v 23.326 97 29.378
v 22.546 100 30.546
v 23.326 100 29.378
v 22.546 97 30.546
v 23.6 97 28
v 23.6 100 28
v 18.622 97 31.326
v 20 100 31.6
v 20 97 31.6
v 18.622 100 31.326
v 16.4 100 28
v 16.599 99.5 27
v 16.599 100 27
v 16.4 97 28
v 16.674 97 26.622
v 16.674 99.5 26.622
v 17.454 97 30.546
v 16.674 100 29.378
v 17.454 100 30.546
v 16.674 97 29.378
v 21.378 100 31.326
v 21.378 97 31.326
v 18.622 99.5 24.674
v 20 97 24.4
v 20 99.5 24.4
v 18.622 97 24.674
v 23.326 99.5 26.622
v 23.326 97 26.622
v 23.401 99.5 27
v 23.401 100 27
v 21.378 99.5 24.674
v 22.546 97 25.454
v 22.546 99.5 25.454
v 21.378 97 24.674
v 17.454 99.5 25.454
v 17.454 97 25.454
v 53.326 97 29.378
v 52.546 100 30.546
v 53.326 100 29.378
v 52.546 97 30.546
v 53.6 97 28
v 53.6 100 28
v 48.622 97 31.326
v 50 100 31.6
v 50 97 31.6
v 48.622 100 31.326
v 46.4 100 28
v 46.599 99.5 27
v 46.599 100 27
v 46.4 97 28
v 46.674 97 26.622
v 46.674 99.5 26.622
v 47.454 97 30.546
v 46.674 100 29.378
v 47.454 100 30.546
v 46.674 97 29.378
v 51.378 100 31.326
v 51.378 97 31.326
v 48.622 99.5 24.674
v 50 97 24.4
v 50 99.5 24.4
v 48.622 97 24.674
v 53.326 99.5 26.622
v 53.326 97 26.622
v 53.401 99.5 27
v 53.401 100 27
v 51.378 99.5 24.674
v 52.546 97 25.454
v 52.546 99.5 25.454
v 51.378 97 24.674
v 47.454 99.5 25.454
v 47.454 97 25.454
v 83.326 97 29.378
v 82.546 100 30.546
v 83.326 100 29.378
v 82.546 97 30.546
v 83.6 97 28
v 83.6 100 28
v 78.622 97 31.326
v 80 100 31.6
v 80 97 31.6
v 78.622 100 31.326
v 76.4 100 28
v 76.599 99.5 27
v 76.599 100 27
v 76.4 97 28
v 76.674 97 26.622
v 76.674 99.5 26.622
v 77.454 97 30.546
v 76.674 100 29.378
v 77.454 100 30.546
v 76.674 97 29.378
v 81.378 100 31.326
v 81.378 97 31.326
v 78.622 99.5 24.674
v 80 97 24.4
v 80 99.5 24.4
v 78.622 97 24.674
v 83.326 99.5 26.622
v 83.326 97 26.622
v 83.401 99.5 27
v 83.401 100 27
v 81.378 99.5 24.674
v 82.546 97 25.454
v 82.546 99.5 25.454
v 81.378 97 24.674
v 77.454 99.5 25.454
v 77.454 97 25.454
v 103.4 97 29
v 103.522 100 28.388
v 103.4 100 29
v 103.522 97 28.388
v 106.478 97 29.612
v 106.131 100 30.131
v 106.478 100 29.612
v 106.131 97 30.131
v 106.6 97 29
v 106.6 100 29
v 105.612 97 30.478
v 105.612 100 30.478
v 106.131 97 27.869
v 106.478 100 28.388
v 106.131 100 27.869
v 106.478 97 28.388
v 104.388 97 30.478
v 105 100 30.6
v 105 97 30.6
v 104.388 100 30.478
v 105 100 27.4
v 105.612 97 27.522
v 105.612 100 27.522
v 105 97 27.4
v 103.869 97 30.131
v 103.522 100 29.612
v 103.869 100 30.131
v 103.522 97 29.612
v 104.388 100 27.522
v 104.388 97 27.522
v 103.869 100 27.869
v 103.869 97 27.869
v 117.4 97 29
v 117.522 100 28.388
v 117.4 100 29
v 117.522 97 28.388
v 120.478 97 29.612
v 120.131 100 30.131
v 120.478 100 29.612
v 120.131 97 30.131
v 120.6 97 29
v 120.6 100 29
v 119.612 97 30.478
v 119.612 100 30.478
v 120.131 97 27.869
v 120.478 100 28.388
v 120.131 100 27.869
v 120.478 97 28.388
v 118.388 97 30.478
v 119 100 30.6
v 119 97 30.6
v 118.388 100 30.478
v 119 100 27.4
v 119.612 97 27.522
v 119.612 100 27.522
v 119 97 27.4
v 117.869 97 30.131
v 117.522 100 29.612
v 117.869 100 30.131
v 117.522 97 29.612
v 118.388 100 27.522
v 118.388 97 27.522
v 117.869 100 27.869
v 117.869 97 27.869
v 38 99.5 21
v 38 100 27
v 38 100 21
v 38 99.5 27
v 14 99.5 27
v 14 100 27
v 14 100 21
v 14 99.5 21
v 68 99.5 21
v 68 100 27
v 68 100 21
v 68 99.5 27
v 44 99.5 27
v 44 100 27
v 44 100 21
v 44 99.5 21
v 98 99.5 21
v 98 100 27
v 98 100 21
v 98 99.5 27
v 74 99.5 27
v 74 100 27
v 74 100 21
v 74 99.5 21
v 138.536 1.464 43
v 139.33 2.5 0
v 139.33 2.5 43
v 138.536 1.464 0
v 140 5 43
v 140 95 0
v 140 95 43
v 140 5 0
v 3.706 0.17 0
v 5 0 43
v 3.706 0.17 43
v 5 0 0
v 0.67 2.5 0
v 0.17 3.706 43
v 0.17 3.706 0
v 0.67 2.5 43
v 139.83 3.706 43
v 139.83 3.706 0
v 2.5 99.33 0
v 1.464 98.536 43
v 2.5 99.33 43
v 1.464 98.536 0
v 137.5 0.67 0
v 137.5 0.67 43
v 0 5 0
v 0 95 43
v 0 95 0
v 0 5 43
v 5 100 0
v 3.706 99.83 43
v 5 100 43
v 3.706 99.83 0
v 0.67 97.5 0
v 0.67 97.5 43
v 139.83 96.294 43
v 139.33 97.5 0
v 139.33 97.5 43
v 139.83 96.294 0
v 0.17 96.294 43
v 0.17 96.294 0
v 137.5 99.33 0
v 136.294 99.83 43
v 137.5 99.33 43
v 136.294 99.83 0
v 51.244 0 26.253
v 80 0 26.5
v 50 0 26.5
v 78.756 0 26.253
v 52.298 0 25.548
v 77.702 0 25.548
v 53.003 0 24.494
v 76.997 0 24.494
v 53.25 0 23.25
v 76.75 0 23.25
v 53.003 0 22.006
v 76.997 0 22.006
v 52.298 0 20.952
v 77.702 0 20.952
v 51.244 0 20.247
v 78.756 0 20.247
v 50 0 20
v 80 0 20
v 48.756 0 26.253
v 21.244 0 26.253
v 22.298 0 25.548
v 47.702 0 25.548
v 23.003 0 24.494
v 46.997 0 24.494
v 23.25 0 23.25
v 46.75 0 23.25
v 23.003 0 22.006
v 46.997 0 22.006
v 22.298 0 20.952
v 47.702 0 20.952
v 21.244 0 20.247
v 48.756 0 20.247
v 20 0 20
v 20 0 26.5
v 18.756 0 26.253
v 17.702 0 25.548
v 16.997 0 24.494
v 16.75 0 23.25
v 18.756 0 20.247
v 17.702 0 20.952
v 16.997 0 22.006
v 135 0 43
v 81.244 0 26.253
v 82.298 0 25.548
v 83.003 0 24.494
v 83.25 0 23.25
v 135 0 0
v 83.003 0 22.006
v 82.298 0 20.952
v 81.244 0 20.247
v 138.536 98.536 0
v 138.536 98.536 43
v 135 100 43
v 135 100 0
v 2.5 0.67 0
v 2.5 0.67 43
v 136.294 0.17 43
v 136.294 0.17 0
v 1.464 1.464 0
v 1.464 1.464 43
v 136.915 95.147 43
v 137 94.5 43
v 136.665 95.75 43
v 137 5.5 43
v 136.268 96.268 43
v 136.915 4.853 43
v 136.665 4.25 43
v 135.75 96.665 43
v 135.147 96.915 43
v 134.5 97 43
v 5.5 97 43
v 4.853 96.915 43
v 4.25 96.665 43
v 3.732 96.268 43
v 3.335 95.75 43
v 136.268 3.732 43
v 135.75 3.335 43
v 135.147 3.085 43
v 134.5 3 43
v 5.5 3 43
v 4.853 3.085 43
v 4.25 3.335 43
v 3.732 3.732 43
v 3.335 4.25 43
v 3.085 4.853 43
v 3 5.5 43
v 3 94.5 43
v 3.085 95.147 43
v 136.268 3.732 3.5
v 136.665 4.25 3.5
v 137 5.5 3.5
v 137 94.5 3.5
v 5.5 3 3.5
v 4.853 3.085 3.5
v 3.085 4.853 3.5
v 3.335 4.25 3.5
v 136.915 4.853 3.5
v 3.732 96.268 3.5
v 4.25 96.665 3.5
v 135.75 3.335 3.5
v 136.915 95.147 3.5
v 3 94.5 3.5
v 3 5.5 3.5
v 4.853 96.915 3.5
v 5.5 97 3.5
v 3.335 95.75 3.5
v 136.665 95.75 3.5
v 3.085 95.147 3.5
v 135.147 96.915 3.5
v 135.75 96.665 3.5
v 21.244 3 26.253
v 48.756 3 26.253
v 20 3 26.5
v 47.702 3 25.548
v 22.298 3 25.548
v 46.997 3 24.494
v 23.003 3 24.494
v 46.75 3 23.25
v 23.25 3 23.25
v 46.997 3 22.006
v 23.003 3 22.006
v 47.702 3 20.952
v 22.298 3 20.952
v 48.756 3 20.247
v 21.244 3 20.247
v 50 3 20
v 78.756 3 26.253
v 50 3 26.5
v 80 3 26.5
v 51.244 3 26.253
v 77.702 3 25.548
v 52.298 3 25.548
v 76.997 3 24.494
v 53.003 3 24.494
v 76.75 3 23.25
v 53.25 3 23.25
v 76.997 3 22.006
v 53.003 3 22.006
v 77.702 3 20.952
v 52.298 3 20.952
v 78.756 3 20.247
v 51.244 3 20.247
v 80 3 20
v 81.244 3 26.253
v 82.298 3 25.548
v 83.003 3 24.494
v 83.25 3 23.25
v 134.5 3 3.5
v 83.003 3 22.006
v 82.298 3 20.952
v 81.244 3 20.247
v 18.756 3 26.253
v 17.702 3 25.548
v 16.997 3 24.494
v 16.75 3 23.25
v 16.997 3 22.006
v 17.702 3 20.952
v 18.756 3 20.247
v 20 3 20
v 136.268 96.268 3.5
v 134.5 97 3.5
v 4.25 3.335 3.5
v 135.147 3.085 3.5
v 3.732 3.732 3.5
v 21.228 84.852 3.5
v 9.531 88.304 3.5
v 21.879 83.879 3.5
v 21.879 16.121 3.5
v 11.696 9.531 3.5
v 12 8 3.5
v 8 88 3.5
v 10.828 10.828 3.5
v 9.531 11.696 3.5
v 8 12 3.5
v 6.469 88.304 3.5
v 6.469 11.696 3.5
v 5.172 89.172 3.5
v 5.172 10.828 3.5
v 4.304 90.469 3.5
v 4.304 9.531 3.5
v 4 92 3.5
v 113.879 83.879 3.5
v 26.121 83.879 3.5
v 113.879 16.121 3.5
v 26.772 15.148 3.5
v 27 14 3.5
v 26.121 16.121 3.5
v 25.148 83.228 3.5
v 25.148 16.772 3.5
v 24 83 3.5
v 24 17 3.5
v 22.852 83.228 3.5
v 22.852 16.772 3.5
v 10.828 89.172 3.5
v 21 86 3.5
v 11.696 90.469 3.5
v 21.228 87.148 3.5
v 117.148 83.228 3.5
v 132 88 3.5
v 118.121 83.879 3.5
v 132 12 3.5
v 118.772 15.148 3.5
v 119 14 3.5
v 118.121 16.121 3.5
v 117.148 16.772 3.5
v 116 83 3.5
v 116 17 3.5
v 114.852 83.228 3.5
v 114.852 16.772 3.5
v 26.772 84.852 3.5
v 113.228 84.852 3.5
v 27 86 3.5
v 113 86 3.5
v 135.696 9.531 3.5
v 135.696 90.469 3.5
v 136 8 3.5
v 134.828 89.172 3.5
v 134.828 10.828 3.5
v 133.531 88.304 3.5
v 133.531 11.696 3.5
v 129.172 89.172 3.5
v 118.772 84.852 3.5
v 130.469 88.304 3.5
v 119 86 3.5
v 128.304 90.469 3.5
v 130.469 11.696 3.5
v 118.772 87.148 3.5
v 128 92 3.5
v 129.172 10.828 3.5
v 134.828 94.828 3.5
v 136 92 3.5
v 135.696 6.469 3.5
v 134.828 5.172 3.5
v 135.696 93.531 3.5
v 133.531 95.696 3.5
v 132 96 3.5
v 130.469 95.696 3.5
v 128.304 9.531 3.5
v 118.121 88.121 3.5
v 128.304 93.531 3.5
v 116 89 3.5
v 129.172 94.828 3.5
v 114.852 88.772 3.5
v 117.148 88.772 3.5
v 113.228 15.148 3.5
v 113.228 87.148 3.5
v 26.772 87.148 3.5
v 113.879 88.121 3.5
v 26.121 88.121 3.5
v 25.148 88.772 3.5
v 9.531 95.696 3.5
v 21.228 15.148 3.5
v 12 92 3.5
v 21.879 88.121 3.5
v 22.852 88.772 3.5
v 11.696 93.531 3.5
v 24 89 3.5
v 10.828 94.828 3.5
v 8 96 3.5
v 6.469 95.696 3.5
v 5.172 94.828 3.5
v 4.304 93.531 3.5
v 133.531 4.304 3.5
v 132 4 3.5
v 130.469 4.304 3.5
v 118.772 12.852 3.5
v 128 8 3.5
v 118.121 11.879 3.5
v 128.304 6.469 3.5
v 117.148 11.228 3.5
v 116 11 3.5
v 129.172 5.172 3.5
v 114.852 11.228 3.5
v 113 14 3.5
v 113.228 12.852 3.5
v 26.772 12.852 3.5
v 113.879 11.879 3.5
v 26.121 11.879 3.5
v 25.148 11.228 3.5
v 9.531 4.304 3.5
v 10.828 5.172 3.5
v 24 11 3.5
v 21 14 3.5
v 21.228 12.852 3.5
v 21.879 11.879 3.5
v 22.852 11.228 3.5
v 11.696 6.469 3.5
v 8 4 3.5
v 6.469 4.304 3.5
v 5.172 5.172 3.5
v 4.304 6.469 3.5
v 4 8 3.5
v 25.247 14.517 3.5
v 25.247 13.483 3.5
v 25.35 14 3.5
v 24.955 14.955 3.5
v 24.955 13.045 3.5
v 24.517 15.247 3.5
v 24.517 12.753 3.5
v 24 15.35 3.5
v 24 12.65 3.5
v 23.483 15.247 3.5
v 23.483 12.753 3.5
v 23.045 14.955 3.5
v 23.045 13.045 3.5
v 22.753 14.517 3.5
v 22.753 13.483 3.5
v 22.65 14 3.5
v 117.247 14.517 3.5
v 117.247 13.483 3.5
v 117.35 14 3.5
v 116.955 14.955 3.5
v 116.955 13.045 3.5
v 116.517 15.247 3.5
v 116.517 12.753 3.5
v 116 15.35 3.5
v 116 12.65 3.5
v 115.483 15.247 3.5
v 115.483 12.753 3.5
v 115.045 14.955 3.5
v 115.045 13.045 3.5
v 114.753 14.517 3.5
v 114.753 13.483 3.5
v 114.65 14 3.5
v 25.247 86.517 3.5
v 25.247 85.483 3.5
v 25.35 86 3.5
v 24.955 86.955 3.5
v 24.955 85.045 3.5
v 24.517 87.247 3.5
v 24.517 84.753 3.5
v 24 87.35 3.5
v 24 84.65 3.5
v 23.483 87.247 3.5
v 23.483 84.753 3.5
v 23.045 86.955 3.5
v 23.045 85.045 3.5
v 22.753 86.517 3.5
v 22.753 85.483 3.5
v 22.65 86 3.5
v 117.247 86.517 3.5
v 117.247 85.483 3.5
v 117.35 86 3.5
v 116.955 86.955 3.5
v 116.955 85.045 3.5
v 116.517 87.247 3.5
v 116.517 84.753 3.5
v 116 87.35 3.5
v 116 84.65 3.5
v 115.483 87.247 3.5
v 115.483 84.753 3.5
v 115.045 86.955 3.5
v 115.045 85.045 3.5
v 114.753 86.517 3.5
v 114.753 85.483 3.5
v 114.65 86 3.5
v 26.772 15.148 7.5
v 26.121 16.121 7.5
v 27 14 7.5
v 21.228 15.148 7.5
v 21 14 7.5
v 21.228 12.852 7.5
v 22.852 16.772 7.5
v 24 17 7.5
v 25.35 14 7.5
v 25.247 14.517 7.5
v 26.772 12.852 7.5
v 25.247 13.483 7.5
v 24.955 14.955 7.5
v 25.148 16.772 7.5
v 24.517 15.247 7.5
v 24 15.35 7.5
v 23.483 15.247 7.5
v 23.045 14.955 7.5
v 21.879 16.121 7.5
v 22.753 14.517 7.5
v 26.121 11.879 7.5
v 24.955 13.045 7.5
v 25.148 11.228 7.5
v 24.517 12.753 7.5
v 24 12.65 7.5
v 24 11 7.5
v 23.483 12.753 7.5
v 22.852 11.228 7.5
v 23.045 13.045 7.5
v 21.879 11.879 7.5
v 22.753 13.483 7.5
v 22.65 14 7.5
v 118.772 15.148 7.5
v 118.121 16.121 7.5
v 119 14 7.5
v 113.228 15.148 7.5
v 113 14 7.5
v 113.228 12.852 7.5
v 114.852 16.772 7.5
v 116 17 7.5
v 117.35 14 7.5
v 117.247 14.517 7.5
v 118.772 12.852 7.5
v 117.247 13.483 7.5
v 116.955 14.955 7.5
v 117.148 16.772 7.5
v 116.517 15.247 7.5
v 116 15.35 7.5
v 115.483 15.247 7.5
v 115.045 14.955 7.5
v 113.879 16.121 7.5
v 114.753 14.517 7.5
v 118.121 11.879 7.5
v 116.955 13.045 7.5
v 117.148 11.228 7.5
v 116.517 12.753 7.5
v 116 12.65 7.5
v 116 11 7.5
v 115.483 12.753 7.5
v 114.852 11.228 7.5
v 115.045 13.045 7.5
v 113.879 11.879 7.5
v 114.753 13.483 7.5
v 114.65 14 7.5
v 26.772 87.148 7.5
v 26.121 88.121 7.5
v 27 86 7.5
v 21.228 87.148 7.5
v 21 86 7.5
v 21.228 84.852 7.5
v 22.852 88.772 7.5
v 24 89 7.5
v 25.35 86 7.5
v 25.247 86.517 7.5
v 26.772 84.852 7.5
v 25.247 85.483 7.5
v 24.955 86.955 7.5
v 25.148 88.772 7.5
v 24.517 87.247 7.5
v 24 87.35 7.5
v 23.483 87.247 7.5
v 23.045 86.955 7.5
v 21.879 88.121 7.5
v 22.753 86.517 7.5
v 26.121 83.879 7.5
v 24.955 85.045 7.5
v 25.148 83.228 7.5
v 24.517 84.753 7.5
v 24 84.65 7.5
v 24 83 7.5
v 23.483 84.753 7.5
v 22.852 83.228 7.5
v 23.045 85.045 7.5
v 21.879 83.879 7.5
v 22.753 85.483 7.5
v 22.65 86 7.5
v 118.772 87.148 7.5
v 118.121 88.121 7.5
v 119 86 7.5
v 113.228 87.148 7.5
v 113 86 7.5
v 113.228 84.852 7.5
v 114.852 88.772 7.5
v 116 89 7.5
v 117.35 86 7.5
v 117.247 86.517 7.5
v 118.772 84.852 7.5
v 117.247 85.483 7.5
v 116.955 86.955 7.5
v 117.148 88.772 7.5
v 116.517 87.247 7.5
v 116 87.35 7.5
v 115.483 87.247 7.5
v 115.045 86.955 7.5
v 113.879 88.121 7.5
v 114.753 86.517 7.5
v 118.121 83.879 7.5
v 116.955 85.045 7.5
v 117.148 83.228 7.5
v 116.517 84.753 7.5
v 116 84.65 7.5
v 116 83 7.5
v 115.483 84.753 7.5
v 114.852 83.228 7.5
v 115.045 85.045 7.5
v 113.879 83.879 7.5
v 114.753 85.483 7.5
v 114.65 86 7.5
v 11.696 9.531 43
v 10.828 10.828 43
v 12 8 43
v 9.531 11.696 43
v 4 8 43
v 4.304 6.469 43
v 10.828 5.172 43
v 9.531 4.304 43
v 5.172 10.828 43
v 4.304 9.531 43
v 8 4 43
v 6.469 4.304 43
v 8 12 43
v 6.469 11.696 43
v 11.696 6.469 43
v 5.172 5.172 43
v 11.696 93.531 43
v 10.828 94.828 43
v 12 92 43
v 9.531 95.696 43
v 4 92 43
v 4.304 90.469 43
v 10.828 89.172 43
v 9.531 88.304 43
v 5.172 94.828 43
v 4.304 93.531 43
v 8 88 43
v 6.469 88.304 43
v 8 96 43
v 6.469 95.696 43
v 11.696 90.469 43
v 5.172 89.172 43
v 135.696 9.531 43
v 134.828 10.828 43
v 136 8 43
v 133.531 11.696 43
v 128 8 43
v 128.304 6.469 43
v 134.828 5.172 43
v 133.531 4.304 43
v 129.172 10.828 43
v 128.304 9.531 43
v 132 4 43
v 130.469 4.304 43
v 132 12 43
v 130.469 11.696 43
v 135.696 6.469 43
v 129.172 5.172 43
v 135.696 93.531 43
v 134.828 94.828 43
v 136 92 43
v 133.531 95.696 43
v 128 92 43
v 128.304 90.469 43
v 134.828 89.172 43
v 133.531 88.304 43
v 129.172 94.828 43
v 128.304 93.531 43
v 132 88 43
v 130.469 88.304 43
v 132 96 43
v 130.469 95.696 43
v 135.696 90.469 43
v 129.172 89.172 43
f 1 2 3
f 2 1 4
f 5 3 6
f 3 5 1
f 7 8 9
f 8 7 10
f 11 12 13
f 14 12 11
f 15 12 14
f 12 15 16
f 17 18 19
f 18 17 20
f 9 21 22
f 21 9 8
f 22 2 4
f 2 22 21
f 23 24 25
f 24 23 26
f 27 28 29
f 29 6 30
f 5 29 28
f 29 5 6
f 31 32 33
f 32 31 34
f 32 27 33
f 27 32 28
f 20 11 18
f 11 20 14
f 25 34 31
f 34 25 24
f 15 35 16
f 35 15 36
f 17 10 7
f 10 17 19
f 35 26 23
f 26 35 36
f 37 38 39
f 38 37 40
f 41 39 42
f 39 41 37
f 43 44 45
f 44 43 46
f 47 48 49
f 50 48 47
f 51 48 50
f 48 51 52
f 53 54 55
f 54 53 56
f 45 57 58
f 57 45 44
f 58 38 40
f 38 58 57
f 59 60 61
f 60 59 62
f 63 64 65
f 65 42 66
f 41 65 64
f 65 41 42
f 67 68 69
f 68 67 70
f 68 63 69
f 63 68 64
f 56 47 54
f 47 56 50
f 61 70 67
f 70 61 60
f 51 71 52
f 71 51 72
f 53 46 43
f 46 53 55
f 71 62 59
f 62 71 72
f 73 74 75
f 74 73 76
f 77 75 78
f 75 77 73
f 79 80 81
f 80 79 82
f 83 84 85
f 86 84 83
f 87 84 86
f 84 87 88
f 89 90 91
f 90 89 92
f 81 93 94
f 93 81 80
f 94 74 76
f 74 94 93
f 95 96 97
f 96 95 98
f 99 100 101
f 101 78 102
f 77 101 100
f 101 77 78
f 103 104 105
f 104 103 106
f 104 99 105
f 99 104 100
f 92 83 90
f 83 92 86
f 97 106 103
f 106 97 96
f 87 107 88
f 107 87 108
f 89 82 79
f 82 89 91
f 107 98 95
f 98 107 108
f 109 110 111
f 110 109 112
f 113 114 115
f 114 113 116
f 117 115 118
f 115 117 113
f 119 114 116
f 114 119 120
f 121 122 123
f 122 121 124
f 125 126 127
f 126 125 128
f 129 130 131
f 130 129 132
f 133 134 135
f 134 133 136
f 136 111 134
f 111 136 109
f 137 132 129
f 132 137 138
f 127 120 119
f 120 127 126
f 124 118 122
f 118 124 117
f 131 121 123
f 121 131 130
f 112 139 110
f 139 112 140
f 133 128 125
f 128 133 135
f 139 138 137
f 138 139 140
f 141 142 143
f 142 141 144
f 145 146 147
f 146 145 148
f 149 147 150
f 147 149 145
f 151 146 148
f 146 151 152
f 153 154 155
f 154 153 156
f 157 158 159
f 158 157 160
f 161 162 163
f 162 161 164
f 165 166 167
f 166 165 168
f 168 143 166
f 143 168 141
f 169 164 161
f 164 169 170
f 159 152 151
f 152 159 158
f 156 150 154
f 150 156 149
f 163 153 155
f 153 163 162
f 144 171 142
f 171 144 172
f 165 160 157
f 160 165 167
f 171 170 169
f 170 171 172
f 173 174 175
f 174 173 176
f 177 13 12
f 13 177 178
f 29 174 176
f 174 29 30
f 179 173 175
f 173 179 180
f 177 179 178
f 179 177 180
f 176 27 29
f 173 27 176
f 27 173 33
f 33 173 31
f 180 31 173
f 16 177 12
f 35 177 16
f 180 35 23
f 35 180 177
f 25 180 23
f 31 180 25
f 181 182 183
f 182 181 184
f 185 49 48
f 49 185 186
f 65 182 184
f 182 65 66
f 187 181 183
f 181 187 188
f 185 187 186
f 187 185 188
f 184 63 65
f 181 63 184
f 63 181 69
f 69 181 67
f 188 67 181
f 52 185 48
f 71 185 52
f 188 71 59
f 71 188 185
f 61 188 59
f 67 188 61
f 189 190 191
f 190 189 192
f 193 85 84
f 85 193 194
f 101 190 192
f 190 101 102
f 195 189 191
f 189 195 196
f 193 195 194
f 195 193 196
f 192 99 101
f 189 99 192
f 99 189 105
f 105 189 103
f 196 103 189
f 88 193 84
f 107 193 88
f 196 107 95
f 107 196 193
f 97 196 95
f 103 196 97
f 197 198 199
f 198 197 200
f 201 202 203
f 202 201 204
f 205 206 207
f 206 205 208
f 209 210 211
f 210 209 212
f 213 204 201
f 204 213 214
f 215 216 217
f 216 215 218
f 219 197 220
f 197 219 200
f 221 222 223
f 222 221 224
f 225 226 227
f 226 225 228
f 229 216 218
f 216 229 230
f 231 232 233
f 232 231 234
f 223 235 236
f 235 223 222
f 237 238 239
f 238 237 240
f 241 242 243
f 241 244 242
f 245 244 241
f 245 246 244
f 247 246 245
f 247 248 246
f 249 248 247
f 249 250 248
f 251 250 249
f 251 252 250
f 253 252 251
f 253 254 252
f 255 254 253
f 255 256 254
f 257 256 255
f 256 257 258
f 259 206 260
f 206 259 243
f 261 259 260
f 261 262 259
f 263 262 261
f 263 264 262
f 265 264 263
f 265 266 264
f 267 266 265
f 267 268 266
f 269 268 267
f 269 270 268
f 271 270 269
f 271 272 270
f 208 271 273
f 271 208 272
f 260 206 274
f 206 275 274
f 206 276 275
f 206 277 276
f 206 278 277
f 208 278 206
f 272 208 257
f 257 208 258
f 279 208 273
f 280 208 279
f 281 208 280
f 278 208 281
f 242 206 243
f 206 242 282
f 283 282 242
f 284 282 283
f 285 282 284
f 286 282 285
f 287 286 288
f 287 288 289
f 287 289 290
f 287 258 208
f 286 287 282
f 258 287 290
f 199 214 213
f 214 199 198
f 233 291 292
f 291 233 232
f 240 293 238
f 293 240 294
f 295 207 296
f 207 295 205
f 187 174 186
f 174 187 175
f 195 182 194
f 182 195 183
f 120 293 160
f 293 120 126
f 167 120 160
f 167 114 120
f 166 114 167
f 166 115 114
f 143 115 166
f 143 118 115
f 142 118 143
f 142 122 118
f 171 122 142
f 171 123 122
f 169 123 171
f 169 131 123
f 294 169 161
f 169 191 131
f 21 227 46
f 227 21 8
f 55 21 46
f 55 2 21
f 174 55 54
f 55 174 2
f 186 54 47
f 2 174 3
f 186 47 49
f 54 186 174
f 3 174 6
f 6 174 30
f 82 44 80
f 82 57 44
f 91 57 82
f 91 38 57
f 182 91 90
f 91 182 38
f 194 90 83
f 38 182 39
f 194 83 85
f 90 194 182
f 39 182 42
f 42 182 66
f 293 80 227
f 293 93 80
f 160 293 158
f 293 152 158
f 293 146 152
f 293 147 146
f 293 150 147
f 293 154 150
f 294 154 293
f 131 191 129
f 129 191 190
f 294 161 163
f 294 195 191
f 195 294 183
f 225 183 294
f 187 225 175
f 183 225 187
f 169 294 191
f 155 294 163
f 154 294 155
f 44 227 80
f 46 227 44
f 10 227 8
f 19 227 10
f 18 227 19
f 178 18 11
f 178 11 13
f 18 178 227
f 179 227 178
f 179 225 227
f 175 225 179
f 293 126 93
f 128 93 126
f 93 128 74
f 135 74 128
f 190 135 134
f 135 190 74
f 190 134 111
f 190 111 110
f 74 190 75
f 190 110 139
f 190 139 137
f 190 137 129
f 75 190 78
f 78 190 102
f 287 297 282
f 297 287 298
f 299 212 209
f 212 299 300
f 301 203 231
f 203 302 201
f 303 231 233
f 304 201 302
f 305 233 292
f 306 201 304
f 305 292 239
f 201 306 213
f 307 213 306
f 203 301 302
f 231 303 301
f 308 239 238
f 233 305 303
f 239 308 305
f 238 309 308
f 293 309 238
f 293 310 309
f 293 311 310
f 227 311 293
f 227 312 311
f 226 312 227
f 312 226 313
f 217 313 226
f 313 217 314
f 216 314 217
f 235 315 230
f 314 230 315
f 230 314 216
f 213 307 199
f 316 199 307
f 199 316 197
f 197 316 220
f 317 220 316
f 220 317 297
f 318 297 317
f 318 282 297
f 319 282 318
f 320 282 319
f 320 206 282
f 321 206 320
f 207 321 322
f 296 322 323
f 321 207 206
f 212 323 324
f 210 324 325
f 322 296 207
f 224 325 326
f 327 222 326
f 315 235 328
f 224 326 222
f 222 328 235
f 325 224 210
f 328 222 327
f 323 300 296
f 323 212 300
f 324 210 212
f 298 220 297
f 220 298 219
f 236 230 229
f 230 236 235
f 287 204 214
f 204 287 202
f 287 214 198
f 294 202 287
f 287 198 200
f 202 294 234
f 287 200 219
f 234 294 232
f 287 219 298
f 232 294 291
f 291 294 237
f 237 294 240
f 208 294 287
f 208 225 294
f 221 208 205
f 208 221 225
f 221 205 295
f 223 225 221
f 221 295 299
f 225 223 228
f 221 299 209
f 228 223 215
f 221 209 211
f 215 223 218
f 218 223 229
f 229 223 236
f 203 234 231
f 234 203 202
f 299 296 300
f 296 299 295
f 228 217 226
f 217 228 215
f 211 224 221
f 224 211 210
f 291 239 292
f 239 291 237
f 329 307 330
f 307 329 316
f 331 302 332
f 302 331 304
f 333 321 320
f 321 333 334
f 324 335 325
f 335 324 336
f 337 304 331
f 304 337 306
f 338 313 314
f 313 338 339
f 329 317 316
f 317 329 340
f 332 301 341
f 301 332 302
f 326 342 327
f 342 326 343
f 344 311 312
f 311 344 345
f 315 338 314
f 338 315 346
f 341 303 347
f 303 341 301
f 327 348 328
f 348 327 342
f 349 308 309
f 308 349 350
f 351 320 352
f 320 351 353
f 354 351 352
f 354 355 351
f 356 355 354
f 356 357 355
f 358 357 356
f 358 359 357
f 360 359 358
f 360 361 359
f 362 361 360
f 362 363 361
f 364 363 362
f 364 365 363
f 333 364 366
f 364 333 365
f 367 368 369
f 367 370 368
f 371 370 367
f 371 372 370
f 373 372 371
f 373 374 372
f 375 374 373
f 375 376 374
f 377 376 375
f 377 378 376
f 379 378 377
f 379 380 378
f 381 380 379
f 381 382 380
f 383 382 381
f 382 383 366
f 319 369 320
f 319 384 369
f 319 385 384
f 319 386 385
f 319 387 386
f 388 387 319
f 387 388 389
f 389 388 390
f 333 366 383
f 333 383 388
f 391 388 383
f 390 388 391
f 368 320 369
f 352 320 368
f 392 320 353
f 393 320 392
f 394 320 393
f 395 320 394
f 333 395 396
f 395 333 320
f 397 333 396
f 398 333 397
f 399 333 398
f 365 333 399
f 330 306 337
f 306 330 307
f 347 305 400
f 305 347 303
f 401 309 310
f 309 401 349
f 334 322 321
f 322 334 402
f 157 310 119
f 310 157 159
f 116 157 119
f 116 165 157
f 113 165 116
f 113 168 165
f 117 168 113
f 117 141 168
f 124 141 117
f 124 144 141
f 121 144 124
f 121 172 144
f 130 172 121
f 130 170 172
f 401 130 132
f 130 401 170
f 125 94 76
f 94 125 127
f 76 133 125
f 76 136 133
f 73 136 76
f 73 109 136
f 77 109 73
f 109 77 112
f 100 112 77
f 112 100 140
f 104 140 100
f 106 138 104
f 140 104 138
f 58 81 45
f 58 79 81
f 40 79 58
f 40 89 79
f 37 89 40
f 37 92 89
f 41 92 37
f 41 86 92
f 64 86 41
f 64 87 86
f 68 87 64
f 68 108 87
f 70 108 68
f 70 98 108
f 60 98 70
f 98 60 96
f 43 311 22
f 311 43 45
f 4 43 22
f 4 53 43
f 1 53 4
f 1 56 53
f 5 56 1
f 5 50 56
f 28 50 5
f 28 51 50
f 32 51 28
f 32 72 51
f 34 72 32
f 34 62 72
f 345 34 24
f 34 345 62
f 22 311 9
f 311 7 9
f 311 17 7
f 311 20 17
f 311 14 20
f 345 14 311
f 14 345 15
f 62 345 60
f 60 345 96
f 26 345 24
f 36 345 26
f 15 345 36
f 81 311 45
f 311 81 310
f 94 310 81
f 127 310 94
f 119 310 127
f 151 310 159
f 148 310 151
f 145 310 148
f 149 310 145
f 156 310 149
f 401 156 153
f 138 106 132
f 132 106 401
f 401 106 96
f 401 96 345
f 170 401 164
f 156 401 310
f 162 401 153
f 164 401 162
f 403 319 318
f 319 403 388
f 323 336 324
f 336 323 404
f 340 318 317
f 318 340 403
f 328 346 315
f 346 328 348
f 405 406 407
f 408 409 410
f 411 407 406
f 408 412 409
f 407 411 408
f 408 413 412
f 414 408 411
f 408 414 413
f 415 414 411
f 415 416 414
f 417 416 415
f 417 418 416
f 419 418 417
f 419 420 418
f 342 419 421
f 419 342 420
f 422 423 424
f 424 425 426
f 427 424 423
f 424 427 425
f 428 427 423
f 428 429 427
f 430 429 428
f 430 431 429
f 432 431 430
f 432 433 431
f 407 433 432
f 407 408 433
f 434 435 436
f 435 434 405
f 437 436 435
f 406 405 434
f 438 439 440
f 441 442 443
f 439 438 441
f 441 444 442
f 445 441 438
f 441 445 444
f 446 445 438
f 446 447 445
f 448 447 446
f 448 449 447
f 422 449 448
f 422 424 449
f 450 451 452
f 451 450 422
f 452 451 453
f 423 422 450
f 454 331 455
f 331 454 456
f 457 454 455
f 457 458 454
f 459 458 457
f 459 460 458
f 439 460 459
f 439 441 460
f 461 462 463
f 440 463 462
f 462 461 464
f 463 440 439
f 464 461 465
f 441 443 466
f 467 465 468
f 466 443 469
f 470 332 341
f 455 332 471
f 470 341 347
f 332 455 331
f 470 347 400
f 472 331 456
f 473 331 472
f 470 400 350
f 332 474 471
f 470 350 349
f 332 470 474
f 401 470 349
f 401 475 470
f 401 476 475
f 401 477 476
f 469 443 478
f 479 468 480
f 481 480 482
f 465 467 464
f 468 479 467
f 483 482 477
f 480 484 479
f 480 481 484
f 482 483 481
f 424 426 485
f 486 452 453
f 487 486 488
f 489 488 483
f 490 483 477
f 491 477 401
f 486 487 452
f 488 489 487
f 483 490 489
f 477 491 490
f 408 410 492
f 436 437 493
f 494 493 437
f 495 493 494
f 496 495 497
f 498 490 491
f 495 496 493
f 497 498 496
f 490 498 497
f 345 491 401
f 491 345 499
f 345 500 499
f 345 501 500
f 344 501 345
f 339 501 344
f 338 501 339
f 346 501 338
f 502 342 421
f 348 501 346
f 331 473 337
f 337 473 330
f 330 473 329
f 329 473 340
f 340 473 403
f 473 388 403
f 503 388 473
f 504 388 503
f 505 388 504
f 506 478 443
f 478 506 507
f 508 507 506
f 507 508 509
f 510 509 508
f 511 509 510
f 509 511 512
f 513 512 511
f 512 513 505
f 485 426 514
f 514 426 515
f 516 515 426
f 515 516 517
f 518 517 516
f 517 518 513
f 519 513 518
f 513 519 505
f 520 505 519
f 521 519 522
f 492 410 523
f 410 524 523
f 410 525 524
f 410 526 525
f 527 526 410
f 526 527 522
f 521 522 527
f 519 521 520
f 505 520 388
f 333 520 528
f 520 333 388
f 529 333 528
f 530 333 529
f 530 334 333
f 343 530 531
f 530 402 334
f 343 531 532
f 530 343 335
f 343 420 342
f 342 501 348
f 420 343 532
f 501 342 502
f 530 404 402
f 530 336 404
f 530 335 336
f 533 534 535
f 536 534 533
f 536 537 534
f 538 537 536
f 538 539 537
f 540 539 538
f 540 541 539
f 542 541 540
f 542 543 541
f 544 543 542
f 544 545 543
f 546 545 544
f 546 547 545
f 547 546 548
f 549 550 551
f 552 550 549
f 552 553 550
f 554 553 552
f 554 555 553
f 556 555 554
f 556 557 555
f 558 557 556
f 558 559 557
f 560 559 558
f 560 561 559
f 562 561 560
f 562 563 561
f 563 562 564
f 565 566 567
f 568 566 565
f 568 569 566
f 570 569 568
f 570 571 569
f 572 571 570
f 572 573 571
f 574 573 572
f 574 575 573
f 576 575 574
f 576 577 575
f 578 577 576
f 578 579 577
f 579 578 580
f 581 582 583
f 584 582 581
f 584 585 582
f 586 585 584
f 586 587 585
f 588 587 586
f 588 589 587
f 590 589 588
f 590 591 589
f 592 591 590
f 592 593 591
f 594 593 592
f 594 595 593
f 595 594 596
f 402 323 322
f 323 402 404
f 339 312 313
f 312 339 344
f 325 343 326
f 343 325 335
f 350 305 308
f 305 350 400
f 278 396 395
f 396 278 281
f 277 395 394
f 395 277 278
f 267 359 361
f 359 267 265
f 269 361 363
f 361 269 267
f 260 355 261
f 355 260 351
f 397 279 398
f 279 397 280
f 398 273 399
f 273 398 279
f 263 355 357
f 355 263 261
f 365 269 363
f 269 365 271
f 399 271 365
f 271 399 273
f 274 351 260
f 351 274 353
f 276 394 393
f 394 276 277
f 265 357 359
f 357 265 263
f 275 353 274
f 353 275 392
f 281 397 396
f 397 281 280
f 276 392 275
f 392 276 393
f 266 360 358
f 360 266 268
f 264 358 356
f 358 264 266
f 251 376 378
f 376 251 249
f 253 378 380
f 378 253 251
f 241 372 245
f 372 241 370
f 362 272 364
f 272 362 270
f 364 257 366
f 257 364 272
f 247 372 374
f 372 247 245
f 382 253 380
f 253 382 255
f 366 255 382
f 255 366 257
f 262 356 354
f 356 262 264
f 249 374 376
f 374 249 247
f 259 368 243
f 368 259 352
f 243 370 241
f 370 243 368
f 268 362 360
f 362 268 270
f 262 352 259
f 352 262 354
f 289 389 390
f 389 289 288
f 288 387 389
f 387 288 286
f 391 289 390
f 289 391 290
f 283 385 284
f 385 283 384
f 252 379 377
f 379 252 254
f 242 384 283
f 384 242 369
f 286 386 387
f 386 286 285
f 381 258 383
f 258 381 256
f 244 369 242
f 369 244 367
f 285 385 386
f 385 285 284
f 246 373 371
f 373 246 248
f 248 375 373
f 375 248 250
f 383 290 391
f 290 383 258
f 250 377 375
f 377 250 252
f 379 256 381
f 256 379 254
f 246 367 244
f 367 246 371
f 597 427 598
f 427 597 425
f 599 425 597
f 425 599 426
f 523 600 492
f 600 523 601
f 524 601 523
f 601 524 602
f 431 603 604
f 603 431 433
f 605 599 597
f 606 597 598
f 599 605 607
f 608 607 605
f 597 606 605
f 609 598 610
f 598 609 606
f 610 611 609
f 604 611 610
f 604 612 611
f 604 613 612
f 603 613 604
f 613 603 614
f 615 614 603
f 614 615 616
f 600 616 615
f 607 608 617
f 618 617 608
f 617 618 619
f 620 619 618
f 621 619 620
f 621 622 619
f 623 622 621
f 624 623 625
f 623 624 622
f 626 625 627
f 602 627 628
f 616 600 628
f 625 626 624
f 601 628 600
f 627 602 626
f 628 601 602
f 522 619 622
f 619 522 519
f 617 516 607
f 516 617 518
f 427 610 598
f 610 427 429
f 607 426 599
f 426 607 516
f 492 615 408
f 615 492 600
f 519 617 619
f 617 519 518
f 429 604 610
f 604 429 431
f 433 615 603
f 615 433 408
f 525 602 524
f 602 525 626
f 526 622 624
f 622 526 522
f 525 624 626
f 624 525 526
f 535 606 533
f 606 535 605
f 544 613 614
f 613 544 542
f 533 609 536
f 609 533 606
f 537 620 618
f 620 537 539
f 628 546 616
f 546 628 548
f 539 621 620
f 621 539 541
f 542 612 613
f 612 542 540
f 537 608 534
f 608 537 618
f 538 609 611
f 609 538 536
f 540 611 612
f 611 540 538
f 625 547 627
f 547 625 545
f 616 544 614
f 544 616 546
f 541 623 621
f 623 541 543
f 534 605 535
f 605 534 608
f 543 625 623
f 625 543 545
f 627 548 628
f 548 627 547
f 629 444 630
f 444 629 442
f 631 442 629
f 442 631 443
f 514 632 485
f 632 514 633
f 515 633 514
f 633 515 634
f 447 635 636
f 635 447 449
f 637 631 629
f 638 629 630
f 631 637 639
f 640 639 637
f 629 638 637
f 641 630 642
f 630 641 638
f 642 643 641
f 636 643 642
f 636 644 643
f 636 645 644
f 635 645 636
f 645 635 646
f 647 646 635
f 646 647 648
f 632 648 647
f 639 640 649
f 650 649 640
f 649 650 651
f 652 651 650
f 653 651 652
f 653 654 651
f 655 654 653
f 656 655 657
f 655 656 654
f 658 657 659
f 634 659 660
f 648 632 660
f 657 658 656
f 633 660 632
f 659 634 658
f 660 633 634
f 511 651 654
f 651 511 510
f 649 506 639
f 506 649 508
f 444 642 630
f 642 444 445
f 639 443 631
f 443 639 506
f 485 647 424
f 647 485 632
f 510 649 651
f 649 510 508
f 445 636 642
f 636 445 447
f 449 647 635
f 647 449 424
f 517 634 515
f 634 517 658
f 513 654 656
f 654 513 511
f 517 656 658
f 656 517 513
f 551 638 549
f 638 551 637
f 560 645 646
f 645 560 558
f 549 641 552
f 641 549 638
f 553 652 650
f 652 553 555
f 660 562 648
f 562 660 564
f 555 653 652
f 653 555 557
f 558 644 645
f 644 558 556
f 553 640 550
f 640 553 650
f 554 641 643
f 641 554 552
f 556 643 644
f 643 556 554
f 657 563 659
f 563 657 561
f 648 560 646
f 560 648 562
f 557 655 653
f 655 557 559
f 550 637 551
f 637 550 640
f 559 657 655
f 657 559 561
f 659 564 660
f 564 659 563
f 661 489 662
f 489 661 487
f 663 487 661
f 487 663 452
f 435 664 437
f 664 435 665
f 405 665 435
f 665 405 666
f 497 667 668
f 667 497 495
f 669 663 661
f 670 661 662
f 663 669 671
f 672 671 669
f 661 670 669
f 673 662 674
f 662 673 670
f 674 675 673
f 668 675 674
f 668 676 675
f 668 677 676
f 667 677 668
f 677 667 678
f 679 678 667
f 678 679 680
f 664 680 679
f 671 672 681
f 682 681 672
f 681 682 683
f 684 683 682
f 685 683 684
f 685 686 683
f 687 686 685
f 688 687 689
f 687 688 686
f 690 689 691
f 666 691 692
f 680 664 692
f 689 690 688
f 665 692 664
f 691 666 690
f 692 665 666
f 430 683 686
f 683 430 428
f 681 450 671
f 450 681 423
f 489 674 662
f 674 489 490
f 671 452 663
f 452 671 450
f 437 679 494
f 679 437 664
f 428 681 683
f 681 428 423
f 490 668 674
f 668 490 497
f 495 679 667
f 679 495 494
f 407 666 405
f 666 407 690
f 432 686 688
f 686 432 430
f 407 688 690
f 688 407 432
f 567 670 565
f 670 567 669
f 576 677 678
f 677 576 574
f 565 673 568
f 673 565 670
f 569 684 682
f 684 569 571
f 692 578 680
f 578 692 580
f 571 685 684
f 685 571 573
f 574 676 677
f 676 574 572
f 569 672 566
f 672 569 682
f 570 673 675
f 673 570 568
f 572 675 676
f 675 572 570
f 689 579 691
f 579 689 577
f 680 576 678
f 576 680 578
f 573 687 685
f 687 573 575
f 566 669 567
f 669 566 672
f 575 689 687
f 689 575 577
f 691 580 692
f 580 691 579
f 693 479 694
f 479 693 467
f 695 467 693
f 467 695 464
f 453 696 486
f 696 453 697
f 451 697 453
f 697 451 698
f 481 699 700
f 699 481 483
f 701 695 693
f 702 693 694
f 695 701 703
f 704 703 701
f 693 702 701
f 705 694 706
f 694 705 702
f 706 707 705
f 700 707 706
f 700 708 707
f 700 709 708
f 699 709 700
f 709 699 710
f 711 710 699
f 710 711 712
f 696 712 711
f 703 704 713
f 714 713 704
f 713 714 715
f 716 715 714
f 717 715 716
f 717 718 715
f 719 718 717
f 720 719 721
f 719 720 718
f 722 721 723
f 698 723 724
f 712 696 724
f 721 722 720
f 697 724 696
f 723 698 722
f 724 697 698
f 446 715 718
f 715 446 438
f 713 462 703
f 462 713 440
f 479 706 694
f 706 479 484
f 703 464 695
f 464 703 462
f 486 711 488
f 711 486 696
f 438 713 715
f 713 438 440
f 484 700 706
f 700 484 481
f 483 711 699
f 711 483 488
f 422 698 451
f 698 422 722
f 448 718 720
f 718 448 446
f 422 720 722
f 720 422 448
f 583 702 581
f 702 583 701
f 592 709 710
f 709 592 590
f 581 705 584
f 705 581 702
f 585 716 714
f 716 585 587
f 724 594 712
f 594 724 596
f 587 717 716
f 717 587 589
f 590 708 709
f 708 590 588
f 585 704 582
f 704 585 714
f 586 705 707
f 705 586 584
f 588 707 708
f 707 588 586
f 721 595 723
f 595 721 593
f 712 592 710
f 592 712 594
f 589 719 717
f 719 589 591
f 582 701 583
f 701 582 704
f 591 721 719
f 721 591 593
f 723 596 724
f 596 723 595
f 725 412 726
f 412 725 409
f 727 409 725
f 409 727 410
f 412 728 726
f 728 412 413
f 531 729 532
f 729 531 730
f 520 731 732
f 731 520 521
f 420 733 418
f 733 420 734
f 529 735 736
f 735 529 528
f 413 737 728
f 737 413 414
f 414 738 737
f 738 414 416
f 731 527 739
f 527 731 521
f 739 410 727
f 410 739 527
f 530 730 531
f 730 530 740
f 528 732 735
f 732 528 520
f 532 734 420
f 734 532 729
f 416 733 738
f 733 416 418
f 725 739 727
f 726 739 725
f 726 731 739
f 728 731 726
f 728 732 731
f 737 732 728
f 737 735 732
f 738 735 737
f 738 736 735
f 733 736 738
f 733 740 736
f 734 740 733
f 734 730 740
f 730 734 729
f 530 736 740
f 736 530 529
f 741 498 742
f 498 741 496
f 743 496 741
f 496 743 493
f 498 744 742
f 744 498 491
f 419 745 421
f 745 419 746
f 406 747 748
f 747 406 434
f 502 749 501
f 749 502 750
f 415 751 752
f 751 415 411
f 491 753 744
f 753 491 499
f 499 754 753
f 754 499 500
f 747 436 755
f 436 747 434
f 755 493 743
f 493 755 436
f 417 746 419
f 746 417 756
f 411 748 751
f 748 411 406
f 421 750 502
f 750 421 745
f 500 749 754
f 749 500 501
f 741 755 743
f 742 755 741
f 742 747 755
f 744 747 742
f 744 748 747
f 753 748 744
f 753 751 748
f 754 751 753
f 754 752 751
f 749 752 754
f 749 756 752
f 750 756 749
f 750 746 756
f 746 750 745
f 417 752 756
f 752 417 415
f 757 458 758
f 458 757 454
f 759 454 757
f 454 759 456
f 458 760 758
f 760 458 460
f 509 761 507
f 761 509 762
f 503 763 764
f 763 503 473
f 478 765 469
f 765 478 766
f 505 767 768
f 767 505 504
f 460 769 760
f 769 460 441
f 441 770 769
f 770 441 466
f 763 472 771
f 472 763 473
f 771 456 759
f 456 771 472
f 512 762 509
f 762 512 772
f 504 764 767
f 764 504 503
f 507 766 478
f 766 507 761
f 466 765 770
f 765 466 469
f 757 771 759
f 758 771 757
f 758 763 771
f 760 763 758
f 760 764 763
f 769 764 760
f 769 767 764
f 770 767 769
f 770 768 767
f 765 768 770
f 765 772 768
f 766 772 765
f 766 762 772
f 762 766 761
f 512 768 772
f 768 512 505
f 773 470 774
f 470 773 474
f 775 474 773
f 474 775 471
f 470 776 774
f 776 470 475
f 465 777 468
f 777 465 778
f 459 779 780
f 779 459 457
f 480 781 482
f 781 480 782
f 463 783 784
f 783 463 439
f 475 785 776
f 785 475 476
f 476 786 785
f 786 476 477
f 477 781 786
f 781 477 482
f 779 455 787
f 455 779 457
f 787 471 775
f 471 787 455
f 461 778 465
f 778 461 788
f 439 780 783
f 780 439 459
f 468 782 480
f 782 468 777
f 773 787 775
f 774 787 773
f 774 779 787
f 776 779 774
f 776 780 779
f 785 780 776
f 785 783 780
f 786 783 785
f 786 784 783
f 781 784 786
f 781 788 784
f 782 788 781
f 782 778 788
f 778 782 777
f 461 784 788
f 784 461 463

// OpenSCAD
/**
 * noise_canceller_box.scad — TM-RFI-ENC-003 Rev A
 * Active Noise Canceller Enclosure
 *
 * Front panel: 3× control knobs (Phase1, Phase2, Gain), LEDs
 * Rear panel: 3× SMA (Main, Reference, Output)
 * Side: DC power jack
 * PCB: 100×80 mm (phase shift + gain + combiner circuits)
 * Copper tape lining for RF shielding
 *
 * Envelope: 140×100×55 mm
 */

// ── Parameters ─────────────────────────────────────────────────────────────
box_w  = 140.0;
box_d  = 100.0;
box_h  = 55.0;
wall   = 3.0;
floor_h = 3.5;
lid_h  = 12.0;
body_h = box_h - lid_h;
r = 5.0;
$fn = 32;

// Knobs: 7mm shaft (RK09 series pot shaft = 6mm D-shaft)
knob_d   = 7.2;   // panel hole
knob_sp  = 30.0;  // spacing between knob centers

// SMA
sma_d    = 6.5;

// LED holes
led_d    = 3.2;

// DC jack (2.1mm barrel)
barrel_d = 6.5;

// PCB
pcb_w    = 100.0;
pcb_d    = 80.0;
pcb_so_h = 4.0;
pcb_so_od = 6.0;
pcb_so_id = 2.7;

screw_d  = 3.3;

module rounded_box(w, d, h, r_) {
    hull()
        for (x=[r_, w-r_]) for (y=[r_, d-r_])
            translate([x, y, 0]) cylinder(h=h, r=r_, $fn=24);
}

module standoff(x, y) {
    translate([x, y, floor_h])
        difference() {
            cylinder(h=pcb_so_h, d=pcb_so_od, $fn=16);
            translate([0,0,-0.5]) cylinder(h=pcb_so_h+1, d=pcb_so_id, $fn=16);
        }
}

module body() {
    difference() {
        rounded_box(box_w, box_d, body_h, r);

        // Inner cavity
        translate([wall, wall, floor_h])
            rounded_box(box_w-2*wall, box_d-2*wall, body_h, r-wall+0.5);

        // ── FRONT PANEL (y=box_d): knobs + LEDs ───────────────────────
        // 3× control knobs: Phase1, Phase2, Gain
        for (i=[0:2])
            translate([20 + i*knob_sp, box_d+0.5, body_h - 15])
            rotate([90,0,0])
                cylinder(h=wall+1, d=knob_d, $fn=16);

        // LED indicators (2×): Signal, Null
        for (i=[0:1])
            translate([105 + i*14, box_d+0.5, body_h - 14])
            rotate([90,0,0])
                cylinder(h=wall+1, d=led_d, $fn=16);

        // Knob labels recess
        for (i=[0:2])
            translate([14 + i*knob_sp, box_d - 0.5, body_h - 22])
                cube([24, 0.8, 6]);

        // ── REAR PANEL (y=0): 3× SMA ──────────────────────────────────
        // MAIN antenna input
        translate([20, -0.5, floor_h + (body_h-floor_h)/2])
        rotate([-90,0,0])
            cylinder(h=wall+1, d=sma_d, $fn=16);
        // REFERENCE input
        translate([50, -0.5, floor_h + (body_h-floor_h)/2])
        rotate([-90,0,0])
            cylinder(h=wall+1, d=sma_d, $fn=16);
        // OUTPUT to SDR
        translate([80, -0.5, floor_h + (body_h-floor_h)/2])
        rotate([-90,0,0])
            cylinder(h=wall+1, d=sma_d, $fn=16);

        // ── RIGHT SIDE: DC power jack ──────────────────────────────────
        translate([box_w+0.5, box_d/2, floor_h + 10])
        rotate([0,90,0])
            cylinder(h=wall+1, d=barrel_d, $fn=16);

        // ── Corner screw holes ─────────────────────────────────────────
        for (x=[8, box_w-8]) for (y=[8, box_d-8])
            translate([x, y, body_h-5])
                cylinder(h=6, d=screw_d, $fn=16);
    }

    // PCB standoffs
    ox = (box_w - pcb_w) / 2;
    oy = (box_d - pcb_d) / 2;
    standoff(ox + 4,       oy + 4);
    standoff(ox + pcb_w-4, oy + 4);
    standoff(ox + 4,       oy + pcb_d-4);
    standoff(ox + pcb_w-4, oy + pcb_d-4);

    // Corner bosses
    for (x=[8, box_w-8]) for (y=[8, box_d-8])
        translate([x, y, 0]) cylinder(h=body_h, d=8, $fn=16);
}

module lid() {
    fl_d = 4.0;
    plate_h = lid_h - fl_d;
    difference() {
        union() {
            rounded_box(box_w, box_d, plate_h, r);
            translate([wall+1, wall+1, plate_h])
                rounded_box(box_w-2*(wall+1), box_d-2*(wall+1), fl_d, r-wall);
        }
        for (x=[8, box_w-8]) for (y=[8, box_d-8])
            translate([x, y, -0.5])
                cylinder(h=lid_h+1, d=screw_d, $fn=16);
    }
}

print_part = "body";  // "body" | "lid"

if (print_part == "body") {
    color("dimgray", 0.9) body();
} else {
    color("gray", 0.9) lid();
}
